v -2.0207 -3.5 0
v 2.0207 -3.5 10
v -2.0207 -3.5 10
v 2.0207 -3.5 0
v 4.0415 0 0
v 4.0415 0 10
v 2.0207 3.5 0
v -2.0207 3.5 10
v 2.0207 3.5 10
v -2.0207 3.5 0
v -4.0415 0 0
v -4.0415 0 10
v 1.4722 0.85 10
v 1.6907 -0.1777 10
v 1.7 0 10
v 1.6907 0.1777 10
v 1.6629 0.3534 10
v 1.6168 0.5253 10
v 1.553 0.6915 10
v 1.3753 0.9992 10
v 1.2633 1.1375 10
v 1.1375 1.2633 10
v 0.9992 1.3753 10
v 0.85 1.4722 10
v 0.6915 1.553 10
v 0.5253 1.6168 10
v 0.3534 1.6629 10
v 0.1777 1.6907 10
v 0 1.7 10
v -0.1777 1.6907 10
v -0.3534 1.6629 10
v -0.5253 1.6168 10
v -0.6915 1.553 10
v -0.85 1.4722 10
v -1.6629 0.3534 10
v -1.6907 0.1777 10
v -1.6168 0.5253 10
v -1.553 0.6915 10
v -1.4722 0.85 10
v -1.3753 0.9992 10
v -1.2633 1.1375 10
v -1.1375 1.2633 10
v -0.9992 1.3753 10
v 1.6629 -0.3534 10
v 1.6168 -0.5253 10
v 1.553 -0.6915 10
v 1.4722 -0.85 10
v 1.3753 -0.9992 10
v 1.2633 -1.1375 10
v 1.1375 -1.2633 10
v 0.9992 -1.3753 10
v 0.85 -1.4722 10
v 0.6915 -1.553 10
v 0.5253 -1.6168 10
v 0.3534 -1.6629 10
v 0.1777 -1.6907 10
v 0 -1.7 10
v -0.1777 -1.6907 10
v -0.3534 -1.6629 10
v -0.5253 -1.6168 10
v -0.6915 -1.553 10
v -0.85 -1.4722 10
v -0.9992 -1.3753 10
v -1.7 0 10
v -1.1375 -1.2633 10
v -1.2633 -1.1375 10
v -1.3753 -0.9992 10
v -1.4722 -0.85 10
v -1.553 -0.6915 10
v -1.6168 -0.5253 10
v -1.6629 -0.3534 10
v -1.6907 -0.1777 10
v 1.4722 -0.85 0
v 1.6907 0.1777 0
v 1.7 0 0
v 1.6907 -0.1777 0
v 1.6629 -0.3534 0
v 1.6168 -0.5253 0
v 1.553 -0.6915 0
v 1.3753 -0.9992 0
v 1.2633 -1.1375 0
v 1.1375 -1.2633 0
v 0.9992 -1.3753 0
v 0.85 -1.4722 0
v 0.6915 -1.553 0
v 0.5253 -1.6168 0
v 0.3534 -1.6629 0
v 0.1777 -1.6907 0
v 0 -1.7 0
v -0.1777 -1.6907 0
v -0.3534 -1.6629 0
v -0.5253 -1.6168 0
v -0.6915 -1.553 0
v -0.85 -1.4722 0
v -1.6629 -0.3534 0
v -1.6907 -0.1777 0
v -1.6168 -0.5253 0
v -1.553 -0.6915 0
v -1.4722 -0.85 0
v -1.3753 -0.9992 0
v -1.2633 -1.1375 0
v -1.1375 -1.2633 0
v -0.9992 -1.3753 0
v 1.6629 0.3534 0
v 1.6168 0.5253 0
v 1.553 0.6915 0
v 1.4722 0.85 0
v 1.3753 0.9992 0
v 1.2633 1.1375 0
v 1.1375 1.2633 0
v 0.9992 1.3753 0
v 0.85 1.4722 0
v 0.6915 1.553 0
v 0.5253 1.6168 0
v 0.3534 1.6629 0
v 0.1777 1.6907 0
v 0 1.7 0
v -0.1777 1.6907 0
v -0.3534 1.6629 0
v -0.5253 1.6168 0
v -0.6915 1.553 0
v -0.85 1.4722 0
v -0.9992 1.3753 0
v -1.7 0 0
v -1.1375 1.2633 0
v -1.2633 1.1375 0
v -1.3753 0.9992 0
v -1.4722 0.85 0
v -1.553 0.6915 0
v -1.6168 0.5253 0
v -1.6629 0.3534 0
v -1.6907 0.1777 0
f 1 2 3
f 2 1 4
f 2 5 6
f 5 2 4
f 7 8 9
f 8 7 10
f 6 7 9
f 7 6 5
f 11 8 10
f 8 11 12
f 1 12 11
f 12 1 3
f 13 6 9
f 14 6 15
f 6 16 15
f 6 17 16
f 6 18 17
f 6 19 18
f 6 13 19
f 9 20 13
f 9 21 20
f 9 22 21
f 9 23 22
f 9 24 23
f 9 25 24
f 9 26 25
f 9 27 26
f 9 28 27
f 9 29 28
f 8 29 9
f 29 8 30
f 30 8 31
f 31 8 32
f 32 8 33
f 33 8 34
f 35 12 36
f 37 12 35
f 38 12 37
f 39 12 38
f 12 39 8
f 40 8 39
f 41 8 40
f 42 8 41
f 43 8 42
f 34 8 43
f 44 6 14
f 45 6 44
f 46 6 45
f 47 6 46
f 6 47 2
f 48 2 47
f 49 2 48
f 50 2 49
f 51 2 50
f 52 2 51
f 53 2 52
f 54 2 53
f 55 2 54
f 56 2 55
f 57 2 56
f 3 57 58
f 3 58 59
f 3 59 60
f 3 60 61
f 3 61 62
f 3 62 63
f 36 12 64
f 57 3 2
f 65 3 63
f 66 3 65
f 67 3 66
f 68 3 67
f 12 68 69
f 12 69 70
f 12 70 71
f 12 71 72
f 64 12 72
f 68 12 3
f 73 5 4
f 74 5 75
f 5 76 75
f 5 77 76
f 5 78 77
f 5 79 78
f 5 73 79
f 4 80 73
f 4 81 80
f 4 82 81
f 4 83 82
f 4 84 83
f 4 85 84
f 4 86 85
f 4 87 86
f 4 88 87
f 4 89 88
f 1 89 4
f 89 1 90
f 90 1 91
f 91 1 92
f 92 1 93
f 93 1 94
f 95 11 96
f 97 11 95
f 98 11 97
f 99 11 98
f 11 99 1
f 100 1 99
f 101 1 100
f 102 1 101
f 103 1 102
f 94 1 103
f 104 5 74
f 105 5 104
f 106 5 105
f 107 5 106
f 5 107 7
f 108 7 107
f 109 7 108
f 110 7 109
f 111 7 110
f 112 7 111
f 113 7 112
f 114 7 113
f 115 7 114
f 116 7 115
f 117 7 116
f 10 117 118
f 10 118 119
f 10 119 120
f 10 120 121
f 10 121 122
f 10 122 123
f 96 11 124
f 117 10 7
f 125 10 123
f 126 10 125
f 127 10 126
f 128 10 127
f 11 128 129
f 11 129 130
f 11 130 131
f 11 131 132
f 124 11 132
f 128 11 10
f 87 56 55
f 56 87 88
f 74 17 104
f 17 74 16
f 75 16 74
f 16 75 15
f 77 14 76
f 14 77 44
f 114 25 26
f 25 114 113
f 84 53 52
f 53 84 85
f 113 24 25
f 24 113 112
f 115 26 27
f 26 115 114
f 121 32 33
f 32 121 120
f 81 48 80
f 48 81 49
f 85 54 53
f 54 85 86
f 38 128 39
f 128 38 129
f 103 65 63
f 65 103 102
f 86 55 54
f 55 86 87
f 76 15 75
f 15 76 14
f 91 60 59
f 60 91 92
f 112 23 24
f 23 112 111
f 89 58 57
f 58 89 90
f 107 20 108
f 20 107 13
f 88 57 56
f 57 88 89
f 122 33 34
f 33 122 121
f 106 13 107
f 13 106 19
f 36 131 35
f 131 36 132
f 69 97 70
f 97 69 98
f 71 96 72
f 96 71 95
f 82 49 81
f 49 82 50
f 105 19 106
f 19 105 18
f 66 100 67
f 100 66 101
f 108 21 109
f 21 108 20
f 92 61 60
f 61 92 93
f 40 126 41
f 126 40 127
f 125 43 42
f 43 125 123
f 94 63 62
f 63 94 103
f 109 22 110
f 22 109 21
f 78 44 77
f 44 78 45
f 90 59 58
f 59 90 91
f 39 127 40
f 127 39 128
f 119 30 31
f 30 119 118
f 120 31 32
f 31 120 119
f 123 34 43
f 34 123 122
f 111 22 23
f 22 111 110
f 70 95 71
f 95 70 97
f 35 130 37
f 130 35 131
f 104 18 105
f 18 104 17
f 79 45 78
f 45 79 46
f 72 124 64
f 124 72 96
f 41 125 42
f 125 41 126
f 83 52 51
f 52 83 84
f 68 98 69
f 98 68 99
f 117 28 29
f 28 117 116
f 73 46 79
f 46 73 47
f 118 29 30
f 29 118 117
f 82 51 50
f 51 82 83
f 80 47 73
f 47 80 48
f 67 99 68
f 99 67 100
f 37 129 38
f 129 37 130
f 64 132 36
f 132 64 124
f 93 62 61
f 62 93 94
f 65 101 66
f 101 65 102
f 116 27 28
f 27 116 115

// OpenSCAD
// Hex standoff, 10 mm long.
$fn = 60;
eps = 0.02;
thread_d = 3.4;
flat = 7;
length = 10;
chamfer = 1.2;
difference() {
    union() {
        cylinder(d = flat / cos(30), h = length, $fn = 6);
        cylinder(d1 = flat / cos(30) - 2 * chamfer, d2 = flat / cos(30), h = chamfer, $fn = 6);
        translate([0, 0, length - chamfer]) cylinder(d1 = flat / cos(30), d2 = flat / cos(30) - 2 * chamfer, h = chamfer, $fn = 6);
    }
    translate([0, 0, -eps]) cylinder(d = thread_d, h = length + 2 * eps);
}
